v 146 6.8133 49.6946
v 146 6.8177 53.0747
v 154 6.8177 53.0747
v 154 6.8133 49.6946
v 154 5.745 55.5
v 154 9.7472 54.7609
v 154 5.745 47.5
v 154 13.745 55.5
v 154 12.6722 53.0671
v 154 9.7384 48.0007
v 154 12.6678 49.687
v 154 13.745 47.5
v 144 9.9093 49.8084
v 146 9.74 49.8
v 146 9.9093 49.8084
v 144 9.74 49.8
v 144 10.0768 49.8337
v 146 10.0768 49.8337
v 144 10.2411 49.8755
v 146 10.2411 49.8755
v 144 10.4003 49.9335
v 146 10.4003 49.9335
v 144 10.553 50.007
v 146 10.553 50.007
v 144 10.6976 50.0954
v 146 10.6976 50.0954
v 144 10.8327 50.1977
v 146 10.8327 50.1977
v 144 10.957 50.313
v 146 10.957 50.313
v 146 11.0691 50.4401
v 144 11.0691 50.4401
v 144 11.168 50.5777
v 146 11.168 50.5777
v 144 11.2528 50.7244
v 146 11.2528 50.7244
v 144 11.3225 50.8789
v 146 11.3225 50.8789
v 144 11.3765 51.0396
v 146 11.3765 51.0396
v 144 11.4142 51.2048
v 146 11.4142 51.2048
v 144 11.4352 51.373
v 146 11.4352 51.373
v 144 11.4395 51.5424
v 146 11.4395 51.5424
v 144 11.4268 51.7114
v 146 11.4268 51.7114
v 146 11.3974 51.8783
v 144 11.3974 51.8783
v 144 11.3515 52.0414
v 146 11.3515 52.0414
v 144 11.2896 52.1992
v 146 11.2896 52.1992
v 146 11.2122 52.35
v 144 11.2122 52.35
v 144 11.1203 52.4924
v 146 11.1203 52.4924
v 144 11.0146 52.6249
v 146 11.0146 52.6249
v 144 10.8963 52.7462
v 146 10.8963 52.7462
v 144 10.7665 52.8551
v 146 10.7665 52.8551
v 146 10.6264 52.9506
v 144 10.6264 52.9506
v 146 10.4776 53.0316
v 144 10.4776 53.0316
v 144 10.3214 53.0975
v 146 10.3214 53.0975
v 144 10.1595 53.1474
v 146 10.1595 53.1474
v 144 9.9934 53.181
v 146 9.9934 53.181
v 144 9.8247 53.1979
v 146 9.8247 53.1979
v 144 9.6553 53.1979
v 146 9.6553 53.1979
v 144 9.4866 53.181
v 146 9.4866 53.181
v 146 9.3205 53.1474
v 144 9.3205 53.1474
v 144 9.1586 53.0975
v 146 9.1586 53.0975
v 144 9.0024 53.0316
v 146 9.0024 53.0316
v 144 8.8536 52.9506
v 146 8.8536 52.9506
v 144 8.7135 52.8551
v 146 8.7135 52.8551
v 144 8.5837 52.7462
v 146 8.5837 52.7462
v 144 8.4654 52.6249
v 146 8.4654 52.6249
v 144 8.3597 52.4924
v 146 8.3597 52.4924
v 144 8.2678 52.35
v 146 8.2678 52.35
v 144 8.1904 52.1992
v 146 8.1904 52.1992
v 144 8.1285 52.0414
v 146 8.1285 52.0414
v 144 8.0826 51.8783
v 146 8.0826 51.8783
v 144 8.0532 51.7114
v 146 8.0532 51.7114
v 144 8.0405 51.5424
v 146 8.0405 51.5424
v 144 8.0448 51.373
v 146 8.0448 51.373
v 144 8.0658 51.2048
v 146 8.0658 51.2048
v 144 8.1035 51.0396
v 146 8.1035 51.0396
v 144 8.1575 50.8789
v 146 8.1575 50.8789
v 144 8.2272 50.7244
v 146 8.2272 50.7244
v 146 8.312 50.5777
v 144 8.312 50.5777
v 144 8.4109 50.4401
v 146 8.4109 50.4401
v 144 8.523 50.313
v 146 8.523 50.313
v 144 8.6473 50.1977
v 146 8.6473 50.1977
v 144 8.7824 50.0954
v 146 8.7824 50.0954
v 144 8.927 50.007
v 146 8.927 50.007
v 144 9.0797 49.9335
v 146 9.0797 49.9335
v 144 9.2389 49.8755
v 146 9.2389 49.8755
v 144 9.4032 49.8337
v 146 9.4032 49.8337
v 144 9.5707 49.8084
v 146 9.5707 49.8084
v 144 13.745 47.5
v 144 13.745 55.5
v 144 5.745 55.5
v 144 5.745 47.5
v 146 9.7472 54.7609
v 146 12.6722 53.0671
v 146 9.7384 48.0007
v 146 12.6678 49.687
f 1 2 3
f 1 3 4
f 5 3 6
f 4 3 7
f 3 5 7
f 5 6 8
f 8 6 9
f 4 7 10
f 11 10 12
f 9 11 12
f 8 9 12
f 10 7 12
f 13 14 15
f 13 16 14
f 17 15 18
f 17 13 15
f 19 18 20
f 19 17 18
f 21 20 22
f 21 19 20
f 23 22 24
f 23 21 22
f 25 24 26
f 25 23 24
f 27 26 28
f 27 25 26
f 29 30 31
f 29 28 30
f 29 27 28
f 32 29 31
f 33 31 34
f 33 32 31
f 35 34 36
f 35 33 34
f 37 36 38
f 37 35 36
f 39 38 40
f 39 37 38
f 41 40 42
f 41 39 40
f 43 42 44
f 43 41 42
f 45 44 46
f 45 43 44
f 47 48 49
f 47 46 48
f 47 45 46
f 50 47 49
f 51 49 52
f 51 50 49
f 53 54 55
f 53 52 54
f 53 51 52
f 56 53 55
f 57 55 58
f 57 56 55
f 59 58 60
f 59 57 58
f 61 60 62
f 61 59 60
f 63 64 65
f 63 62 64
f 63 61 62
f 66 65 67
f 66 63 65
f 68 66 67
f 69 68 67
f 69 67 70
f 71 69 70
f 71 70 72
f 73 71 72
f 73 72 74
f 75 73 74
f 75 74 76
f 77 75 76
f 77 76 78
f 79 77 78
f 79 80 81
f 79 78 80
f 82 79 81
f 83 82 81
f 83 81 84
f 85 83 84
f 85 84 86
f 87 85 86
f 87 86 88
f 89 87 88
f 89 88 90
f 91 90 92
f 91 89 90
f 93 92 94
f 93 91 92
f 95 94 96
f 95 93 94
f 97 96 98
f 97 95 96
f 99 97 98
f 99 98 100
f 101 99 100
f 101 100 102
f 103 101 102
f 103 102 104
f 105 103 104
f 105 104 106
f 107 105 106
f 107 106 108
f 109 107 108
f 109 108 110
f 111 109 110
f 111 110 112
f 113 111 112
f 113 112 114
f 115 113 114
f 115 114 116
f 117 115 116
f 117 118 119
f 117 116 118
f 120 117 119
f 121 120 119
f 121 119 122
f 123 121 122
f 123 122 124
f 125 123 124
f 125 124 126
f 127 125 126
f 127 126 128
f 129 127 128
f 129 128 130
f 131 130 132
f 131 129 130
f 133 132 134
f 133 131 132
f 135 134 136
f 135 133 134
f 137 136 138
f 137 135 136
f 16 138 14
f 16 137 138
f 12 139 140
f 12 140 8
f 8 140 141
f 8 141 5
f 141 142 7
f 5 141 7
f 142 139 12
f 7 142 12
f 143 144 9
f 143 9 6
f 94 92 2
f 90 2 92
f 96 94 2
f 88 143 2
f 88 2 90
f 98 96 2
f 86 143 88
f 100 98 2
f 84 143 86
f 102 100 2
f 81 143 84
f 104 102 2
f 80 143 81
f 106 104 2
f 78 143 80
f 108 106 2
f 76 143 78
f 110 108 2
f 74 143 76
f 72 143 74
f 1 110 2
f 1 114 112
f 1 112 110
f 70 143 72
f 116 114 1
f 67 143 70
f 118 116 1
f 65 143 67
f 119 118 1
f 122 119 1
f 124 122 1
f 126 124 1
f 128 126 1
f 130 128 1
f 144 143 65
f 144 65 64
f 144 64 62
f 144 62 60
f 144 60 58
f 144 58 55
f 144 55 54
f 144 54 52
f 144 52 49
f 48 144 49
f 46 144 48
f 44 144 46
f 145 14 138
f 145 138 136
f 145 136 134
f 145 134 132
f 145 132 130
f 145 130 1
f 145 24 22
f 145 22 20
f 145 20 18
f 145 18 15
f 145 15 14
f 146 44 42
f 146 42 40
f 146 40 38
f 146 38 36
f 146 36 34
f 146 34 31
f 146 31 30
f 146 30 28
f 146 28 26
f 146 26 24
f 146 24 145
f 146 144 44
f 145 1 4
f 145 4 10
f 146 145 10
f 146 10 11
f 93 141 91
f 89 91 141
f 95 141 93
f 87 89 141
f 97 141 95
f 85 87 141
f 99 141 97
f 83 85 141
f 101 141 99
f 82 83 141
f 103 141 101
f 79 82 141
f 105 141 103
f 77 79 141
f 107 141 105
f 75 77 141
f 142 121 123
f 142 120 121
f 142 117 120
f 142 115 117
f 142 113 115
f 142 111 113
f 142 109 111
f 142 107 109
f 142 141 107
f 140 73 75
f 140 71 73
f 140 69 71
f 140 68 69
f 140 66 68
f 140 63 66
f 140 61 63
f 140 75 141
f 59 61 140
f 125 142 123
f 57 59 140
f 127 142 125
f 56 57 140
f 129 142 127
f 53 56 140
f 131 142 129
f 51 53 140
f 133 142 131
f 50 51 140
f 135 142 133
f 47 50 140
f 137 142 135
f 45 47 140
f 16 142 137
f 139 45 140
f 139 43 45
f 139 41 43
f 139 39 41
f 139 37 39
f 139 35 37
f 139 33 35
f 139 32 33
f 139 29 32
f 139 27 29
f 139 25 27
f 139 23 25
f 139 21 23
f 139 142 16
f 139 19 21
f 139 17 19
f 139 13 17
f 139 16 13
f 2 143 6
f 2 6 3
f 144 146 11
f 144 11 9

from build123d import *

# Parameters (mm, degrees)
CYLINDER031_R              = 1.7
CYLINDER031_DEPTH          = 20
EXTRUDE004_DEPTH           = 9
EXTRUDE004_PLACEMENT_ANGLE = 90
BOX042_W                   = 10
BOX042_H                   = 8
BOX042_DEPTH               = 8


with BuildPart() as cylinder031:
    # Cylinder031 → Cylinder031 (new body)
    with BuildSketch(Plane(origin=(140, 9.74, 51.5), x_dir=(0, 0, -1), z_dir=(1, 0, 0))):
        Circle(CYLINDER031_R)
    extrude(amount=CYLINDER031_DEPTH)


with BuildPart() as extrude004:
    # Sketch004 → Extrude004 (new body)
    with BuildSketch(Plane.XY.offset(75)):
        Polygon((-29.694611, 6.813304), (-28.00073, 9.738351), (-29.686954, 12.667818), (-33.06706, 12.672239), (-34.760941, 9.747192), (-33.074716, 6.817725), align=None)
    extrude(amount=EXTRUDE004_DEPTH)


with BuildPart() as extrude004_1:
    # Extrude004 placement: moved
    add(extrude004.part.moved(Location((71, 0, 0))).rotate(Axis((71, 0, 0), (0, 1, 0)), EXTRUDE004_PLACEMENT_ANGLE))


with BuildPart() as cut050:
    # Box042 → Box042 (new body)
    with BuildSketch(Plane(origin=(144, 5.745, 27.5), x_dir=(1, 0, 0), z_dir=(0, 0, 1))):
        with Locations((5, 4)):
            Rectangle(BOX042_W, BOX042_H)
    extrude(amount=BOX042_DEPTH)

    # Cut049: cut Extrude004
    add(extrude004_1.part, mode=Mode.SUBTRACT)


with BuildPart() as cut050_1:
    # Cut049 placement: moved
    add(cut050.part.moved(Location((0, 0, 20))))

    # Cut050: cut Cylinder031
    add(cylinder031.part, mode=Mode.SUBTRACT)


solid = cut050_1.part
